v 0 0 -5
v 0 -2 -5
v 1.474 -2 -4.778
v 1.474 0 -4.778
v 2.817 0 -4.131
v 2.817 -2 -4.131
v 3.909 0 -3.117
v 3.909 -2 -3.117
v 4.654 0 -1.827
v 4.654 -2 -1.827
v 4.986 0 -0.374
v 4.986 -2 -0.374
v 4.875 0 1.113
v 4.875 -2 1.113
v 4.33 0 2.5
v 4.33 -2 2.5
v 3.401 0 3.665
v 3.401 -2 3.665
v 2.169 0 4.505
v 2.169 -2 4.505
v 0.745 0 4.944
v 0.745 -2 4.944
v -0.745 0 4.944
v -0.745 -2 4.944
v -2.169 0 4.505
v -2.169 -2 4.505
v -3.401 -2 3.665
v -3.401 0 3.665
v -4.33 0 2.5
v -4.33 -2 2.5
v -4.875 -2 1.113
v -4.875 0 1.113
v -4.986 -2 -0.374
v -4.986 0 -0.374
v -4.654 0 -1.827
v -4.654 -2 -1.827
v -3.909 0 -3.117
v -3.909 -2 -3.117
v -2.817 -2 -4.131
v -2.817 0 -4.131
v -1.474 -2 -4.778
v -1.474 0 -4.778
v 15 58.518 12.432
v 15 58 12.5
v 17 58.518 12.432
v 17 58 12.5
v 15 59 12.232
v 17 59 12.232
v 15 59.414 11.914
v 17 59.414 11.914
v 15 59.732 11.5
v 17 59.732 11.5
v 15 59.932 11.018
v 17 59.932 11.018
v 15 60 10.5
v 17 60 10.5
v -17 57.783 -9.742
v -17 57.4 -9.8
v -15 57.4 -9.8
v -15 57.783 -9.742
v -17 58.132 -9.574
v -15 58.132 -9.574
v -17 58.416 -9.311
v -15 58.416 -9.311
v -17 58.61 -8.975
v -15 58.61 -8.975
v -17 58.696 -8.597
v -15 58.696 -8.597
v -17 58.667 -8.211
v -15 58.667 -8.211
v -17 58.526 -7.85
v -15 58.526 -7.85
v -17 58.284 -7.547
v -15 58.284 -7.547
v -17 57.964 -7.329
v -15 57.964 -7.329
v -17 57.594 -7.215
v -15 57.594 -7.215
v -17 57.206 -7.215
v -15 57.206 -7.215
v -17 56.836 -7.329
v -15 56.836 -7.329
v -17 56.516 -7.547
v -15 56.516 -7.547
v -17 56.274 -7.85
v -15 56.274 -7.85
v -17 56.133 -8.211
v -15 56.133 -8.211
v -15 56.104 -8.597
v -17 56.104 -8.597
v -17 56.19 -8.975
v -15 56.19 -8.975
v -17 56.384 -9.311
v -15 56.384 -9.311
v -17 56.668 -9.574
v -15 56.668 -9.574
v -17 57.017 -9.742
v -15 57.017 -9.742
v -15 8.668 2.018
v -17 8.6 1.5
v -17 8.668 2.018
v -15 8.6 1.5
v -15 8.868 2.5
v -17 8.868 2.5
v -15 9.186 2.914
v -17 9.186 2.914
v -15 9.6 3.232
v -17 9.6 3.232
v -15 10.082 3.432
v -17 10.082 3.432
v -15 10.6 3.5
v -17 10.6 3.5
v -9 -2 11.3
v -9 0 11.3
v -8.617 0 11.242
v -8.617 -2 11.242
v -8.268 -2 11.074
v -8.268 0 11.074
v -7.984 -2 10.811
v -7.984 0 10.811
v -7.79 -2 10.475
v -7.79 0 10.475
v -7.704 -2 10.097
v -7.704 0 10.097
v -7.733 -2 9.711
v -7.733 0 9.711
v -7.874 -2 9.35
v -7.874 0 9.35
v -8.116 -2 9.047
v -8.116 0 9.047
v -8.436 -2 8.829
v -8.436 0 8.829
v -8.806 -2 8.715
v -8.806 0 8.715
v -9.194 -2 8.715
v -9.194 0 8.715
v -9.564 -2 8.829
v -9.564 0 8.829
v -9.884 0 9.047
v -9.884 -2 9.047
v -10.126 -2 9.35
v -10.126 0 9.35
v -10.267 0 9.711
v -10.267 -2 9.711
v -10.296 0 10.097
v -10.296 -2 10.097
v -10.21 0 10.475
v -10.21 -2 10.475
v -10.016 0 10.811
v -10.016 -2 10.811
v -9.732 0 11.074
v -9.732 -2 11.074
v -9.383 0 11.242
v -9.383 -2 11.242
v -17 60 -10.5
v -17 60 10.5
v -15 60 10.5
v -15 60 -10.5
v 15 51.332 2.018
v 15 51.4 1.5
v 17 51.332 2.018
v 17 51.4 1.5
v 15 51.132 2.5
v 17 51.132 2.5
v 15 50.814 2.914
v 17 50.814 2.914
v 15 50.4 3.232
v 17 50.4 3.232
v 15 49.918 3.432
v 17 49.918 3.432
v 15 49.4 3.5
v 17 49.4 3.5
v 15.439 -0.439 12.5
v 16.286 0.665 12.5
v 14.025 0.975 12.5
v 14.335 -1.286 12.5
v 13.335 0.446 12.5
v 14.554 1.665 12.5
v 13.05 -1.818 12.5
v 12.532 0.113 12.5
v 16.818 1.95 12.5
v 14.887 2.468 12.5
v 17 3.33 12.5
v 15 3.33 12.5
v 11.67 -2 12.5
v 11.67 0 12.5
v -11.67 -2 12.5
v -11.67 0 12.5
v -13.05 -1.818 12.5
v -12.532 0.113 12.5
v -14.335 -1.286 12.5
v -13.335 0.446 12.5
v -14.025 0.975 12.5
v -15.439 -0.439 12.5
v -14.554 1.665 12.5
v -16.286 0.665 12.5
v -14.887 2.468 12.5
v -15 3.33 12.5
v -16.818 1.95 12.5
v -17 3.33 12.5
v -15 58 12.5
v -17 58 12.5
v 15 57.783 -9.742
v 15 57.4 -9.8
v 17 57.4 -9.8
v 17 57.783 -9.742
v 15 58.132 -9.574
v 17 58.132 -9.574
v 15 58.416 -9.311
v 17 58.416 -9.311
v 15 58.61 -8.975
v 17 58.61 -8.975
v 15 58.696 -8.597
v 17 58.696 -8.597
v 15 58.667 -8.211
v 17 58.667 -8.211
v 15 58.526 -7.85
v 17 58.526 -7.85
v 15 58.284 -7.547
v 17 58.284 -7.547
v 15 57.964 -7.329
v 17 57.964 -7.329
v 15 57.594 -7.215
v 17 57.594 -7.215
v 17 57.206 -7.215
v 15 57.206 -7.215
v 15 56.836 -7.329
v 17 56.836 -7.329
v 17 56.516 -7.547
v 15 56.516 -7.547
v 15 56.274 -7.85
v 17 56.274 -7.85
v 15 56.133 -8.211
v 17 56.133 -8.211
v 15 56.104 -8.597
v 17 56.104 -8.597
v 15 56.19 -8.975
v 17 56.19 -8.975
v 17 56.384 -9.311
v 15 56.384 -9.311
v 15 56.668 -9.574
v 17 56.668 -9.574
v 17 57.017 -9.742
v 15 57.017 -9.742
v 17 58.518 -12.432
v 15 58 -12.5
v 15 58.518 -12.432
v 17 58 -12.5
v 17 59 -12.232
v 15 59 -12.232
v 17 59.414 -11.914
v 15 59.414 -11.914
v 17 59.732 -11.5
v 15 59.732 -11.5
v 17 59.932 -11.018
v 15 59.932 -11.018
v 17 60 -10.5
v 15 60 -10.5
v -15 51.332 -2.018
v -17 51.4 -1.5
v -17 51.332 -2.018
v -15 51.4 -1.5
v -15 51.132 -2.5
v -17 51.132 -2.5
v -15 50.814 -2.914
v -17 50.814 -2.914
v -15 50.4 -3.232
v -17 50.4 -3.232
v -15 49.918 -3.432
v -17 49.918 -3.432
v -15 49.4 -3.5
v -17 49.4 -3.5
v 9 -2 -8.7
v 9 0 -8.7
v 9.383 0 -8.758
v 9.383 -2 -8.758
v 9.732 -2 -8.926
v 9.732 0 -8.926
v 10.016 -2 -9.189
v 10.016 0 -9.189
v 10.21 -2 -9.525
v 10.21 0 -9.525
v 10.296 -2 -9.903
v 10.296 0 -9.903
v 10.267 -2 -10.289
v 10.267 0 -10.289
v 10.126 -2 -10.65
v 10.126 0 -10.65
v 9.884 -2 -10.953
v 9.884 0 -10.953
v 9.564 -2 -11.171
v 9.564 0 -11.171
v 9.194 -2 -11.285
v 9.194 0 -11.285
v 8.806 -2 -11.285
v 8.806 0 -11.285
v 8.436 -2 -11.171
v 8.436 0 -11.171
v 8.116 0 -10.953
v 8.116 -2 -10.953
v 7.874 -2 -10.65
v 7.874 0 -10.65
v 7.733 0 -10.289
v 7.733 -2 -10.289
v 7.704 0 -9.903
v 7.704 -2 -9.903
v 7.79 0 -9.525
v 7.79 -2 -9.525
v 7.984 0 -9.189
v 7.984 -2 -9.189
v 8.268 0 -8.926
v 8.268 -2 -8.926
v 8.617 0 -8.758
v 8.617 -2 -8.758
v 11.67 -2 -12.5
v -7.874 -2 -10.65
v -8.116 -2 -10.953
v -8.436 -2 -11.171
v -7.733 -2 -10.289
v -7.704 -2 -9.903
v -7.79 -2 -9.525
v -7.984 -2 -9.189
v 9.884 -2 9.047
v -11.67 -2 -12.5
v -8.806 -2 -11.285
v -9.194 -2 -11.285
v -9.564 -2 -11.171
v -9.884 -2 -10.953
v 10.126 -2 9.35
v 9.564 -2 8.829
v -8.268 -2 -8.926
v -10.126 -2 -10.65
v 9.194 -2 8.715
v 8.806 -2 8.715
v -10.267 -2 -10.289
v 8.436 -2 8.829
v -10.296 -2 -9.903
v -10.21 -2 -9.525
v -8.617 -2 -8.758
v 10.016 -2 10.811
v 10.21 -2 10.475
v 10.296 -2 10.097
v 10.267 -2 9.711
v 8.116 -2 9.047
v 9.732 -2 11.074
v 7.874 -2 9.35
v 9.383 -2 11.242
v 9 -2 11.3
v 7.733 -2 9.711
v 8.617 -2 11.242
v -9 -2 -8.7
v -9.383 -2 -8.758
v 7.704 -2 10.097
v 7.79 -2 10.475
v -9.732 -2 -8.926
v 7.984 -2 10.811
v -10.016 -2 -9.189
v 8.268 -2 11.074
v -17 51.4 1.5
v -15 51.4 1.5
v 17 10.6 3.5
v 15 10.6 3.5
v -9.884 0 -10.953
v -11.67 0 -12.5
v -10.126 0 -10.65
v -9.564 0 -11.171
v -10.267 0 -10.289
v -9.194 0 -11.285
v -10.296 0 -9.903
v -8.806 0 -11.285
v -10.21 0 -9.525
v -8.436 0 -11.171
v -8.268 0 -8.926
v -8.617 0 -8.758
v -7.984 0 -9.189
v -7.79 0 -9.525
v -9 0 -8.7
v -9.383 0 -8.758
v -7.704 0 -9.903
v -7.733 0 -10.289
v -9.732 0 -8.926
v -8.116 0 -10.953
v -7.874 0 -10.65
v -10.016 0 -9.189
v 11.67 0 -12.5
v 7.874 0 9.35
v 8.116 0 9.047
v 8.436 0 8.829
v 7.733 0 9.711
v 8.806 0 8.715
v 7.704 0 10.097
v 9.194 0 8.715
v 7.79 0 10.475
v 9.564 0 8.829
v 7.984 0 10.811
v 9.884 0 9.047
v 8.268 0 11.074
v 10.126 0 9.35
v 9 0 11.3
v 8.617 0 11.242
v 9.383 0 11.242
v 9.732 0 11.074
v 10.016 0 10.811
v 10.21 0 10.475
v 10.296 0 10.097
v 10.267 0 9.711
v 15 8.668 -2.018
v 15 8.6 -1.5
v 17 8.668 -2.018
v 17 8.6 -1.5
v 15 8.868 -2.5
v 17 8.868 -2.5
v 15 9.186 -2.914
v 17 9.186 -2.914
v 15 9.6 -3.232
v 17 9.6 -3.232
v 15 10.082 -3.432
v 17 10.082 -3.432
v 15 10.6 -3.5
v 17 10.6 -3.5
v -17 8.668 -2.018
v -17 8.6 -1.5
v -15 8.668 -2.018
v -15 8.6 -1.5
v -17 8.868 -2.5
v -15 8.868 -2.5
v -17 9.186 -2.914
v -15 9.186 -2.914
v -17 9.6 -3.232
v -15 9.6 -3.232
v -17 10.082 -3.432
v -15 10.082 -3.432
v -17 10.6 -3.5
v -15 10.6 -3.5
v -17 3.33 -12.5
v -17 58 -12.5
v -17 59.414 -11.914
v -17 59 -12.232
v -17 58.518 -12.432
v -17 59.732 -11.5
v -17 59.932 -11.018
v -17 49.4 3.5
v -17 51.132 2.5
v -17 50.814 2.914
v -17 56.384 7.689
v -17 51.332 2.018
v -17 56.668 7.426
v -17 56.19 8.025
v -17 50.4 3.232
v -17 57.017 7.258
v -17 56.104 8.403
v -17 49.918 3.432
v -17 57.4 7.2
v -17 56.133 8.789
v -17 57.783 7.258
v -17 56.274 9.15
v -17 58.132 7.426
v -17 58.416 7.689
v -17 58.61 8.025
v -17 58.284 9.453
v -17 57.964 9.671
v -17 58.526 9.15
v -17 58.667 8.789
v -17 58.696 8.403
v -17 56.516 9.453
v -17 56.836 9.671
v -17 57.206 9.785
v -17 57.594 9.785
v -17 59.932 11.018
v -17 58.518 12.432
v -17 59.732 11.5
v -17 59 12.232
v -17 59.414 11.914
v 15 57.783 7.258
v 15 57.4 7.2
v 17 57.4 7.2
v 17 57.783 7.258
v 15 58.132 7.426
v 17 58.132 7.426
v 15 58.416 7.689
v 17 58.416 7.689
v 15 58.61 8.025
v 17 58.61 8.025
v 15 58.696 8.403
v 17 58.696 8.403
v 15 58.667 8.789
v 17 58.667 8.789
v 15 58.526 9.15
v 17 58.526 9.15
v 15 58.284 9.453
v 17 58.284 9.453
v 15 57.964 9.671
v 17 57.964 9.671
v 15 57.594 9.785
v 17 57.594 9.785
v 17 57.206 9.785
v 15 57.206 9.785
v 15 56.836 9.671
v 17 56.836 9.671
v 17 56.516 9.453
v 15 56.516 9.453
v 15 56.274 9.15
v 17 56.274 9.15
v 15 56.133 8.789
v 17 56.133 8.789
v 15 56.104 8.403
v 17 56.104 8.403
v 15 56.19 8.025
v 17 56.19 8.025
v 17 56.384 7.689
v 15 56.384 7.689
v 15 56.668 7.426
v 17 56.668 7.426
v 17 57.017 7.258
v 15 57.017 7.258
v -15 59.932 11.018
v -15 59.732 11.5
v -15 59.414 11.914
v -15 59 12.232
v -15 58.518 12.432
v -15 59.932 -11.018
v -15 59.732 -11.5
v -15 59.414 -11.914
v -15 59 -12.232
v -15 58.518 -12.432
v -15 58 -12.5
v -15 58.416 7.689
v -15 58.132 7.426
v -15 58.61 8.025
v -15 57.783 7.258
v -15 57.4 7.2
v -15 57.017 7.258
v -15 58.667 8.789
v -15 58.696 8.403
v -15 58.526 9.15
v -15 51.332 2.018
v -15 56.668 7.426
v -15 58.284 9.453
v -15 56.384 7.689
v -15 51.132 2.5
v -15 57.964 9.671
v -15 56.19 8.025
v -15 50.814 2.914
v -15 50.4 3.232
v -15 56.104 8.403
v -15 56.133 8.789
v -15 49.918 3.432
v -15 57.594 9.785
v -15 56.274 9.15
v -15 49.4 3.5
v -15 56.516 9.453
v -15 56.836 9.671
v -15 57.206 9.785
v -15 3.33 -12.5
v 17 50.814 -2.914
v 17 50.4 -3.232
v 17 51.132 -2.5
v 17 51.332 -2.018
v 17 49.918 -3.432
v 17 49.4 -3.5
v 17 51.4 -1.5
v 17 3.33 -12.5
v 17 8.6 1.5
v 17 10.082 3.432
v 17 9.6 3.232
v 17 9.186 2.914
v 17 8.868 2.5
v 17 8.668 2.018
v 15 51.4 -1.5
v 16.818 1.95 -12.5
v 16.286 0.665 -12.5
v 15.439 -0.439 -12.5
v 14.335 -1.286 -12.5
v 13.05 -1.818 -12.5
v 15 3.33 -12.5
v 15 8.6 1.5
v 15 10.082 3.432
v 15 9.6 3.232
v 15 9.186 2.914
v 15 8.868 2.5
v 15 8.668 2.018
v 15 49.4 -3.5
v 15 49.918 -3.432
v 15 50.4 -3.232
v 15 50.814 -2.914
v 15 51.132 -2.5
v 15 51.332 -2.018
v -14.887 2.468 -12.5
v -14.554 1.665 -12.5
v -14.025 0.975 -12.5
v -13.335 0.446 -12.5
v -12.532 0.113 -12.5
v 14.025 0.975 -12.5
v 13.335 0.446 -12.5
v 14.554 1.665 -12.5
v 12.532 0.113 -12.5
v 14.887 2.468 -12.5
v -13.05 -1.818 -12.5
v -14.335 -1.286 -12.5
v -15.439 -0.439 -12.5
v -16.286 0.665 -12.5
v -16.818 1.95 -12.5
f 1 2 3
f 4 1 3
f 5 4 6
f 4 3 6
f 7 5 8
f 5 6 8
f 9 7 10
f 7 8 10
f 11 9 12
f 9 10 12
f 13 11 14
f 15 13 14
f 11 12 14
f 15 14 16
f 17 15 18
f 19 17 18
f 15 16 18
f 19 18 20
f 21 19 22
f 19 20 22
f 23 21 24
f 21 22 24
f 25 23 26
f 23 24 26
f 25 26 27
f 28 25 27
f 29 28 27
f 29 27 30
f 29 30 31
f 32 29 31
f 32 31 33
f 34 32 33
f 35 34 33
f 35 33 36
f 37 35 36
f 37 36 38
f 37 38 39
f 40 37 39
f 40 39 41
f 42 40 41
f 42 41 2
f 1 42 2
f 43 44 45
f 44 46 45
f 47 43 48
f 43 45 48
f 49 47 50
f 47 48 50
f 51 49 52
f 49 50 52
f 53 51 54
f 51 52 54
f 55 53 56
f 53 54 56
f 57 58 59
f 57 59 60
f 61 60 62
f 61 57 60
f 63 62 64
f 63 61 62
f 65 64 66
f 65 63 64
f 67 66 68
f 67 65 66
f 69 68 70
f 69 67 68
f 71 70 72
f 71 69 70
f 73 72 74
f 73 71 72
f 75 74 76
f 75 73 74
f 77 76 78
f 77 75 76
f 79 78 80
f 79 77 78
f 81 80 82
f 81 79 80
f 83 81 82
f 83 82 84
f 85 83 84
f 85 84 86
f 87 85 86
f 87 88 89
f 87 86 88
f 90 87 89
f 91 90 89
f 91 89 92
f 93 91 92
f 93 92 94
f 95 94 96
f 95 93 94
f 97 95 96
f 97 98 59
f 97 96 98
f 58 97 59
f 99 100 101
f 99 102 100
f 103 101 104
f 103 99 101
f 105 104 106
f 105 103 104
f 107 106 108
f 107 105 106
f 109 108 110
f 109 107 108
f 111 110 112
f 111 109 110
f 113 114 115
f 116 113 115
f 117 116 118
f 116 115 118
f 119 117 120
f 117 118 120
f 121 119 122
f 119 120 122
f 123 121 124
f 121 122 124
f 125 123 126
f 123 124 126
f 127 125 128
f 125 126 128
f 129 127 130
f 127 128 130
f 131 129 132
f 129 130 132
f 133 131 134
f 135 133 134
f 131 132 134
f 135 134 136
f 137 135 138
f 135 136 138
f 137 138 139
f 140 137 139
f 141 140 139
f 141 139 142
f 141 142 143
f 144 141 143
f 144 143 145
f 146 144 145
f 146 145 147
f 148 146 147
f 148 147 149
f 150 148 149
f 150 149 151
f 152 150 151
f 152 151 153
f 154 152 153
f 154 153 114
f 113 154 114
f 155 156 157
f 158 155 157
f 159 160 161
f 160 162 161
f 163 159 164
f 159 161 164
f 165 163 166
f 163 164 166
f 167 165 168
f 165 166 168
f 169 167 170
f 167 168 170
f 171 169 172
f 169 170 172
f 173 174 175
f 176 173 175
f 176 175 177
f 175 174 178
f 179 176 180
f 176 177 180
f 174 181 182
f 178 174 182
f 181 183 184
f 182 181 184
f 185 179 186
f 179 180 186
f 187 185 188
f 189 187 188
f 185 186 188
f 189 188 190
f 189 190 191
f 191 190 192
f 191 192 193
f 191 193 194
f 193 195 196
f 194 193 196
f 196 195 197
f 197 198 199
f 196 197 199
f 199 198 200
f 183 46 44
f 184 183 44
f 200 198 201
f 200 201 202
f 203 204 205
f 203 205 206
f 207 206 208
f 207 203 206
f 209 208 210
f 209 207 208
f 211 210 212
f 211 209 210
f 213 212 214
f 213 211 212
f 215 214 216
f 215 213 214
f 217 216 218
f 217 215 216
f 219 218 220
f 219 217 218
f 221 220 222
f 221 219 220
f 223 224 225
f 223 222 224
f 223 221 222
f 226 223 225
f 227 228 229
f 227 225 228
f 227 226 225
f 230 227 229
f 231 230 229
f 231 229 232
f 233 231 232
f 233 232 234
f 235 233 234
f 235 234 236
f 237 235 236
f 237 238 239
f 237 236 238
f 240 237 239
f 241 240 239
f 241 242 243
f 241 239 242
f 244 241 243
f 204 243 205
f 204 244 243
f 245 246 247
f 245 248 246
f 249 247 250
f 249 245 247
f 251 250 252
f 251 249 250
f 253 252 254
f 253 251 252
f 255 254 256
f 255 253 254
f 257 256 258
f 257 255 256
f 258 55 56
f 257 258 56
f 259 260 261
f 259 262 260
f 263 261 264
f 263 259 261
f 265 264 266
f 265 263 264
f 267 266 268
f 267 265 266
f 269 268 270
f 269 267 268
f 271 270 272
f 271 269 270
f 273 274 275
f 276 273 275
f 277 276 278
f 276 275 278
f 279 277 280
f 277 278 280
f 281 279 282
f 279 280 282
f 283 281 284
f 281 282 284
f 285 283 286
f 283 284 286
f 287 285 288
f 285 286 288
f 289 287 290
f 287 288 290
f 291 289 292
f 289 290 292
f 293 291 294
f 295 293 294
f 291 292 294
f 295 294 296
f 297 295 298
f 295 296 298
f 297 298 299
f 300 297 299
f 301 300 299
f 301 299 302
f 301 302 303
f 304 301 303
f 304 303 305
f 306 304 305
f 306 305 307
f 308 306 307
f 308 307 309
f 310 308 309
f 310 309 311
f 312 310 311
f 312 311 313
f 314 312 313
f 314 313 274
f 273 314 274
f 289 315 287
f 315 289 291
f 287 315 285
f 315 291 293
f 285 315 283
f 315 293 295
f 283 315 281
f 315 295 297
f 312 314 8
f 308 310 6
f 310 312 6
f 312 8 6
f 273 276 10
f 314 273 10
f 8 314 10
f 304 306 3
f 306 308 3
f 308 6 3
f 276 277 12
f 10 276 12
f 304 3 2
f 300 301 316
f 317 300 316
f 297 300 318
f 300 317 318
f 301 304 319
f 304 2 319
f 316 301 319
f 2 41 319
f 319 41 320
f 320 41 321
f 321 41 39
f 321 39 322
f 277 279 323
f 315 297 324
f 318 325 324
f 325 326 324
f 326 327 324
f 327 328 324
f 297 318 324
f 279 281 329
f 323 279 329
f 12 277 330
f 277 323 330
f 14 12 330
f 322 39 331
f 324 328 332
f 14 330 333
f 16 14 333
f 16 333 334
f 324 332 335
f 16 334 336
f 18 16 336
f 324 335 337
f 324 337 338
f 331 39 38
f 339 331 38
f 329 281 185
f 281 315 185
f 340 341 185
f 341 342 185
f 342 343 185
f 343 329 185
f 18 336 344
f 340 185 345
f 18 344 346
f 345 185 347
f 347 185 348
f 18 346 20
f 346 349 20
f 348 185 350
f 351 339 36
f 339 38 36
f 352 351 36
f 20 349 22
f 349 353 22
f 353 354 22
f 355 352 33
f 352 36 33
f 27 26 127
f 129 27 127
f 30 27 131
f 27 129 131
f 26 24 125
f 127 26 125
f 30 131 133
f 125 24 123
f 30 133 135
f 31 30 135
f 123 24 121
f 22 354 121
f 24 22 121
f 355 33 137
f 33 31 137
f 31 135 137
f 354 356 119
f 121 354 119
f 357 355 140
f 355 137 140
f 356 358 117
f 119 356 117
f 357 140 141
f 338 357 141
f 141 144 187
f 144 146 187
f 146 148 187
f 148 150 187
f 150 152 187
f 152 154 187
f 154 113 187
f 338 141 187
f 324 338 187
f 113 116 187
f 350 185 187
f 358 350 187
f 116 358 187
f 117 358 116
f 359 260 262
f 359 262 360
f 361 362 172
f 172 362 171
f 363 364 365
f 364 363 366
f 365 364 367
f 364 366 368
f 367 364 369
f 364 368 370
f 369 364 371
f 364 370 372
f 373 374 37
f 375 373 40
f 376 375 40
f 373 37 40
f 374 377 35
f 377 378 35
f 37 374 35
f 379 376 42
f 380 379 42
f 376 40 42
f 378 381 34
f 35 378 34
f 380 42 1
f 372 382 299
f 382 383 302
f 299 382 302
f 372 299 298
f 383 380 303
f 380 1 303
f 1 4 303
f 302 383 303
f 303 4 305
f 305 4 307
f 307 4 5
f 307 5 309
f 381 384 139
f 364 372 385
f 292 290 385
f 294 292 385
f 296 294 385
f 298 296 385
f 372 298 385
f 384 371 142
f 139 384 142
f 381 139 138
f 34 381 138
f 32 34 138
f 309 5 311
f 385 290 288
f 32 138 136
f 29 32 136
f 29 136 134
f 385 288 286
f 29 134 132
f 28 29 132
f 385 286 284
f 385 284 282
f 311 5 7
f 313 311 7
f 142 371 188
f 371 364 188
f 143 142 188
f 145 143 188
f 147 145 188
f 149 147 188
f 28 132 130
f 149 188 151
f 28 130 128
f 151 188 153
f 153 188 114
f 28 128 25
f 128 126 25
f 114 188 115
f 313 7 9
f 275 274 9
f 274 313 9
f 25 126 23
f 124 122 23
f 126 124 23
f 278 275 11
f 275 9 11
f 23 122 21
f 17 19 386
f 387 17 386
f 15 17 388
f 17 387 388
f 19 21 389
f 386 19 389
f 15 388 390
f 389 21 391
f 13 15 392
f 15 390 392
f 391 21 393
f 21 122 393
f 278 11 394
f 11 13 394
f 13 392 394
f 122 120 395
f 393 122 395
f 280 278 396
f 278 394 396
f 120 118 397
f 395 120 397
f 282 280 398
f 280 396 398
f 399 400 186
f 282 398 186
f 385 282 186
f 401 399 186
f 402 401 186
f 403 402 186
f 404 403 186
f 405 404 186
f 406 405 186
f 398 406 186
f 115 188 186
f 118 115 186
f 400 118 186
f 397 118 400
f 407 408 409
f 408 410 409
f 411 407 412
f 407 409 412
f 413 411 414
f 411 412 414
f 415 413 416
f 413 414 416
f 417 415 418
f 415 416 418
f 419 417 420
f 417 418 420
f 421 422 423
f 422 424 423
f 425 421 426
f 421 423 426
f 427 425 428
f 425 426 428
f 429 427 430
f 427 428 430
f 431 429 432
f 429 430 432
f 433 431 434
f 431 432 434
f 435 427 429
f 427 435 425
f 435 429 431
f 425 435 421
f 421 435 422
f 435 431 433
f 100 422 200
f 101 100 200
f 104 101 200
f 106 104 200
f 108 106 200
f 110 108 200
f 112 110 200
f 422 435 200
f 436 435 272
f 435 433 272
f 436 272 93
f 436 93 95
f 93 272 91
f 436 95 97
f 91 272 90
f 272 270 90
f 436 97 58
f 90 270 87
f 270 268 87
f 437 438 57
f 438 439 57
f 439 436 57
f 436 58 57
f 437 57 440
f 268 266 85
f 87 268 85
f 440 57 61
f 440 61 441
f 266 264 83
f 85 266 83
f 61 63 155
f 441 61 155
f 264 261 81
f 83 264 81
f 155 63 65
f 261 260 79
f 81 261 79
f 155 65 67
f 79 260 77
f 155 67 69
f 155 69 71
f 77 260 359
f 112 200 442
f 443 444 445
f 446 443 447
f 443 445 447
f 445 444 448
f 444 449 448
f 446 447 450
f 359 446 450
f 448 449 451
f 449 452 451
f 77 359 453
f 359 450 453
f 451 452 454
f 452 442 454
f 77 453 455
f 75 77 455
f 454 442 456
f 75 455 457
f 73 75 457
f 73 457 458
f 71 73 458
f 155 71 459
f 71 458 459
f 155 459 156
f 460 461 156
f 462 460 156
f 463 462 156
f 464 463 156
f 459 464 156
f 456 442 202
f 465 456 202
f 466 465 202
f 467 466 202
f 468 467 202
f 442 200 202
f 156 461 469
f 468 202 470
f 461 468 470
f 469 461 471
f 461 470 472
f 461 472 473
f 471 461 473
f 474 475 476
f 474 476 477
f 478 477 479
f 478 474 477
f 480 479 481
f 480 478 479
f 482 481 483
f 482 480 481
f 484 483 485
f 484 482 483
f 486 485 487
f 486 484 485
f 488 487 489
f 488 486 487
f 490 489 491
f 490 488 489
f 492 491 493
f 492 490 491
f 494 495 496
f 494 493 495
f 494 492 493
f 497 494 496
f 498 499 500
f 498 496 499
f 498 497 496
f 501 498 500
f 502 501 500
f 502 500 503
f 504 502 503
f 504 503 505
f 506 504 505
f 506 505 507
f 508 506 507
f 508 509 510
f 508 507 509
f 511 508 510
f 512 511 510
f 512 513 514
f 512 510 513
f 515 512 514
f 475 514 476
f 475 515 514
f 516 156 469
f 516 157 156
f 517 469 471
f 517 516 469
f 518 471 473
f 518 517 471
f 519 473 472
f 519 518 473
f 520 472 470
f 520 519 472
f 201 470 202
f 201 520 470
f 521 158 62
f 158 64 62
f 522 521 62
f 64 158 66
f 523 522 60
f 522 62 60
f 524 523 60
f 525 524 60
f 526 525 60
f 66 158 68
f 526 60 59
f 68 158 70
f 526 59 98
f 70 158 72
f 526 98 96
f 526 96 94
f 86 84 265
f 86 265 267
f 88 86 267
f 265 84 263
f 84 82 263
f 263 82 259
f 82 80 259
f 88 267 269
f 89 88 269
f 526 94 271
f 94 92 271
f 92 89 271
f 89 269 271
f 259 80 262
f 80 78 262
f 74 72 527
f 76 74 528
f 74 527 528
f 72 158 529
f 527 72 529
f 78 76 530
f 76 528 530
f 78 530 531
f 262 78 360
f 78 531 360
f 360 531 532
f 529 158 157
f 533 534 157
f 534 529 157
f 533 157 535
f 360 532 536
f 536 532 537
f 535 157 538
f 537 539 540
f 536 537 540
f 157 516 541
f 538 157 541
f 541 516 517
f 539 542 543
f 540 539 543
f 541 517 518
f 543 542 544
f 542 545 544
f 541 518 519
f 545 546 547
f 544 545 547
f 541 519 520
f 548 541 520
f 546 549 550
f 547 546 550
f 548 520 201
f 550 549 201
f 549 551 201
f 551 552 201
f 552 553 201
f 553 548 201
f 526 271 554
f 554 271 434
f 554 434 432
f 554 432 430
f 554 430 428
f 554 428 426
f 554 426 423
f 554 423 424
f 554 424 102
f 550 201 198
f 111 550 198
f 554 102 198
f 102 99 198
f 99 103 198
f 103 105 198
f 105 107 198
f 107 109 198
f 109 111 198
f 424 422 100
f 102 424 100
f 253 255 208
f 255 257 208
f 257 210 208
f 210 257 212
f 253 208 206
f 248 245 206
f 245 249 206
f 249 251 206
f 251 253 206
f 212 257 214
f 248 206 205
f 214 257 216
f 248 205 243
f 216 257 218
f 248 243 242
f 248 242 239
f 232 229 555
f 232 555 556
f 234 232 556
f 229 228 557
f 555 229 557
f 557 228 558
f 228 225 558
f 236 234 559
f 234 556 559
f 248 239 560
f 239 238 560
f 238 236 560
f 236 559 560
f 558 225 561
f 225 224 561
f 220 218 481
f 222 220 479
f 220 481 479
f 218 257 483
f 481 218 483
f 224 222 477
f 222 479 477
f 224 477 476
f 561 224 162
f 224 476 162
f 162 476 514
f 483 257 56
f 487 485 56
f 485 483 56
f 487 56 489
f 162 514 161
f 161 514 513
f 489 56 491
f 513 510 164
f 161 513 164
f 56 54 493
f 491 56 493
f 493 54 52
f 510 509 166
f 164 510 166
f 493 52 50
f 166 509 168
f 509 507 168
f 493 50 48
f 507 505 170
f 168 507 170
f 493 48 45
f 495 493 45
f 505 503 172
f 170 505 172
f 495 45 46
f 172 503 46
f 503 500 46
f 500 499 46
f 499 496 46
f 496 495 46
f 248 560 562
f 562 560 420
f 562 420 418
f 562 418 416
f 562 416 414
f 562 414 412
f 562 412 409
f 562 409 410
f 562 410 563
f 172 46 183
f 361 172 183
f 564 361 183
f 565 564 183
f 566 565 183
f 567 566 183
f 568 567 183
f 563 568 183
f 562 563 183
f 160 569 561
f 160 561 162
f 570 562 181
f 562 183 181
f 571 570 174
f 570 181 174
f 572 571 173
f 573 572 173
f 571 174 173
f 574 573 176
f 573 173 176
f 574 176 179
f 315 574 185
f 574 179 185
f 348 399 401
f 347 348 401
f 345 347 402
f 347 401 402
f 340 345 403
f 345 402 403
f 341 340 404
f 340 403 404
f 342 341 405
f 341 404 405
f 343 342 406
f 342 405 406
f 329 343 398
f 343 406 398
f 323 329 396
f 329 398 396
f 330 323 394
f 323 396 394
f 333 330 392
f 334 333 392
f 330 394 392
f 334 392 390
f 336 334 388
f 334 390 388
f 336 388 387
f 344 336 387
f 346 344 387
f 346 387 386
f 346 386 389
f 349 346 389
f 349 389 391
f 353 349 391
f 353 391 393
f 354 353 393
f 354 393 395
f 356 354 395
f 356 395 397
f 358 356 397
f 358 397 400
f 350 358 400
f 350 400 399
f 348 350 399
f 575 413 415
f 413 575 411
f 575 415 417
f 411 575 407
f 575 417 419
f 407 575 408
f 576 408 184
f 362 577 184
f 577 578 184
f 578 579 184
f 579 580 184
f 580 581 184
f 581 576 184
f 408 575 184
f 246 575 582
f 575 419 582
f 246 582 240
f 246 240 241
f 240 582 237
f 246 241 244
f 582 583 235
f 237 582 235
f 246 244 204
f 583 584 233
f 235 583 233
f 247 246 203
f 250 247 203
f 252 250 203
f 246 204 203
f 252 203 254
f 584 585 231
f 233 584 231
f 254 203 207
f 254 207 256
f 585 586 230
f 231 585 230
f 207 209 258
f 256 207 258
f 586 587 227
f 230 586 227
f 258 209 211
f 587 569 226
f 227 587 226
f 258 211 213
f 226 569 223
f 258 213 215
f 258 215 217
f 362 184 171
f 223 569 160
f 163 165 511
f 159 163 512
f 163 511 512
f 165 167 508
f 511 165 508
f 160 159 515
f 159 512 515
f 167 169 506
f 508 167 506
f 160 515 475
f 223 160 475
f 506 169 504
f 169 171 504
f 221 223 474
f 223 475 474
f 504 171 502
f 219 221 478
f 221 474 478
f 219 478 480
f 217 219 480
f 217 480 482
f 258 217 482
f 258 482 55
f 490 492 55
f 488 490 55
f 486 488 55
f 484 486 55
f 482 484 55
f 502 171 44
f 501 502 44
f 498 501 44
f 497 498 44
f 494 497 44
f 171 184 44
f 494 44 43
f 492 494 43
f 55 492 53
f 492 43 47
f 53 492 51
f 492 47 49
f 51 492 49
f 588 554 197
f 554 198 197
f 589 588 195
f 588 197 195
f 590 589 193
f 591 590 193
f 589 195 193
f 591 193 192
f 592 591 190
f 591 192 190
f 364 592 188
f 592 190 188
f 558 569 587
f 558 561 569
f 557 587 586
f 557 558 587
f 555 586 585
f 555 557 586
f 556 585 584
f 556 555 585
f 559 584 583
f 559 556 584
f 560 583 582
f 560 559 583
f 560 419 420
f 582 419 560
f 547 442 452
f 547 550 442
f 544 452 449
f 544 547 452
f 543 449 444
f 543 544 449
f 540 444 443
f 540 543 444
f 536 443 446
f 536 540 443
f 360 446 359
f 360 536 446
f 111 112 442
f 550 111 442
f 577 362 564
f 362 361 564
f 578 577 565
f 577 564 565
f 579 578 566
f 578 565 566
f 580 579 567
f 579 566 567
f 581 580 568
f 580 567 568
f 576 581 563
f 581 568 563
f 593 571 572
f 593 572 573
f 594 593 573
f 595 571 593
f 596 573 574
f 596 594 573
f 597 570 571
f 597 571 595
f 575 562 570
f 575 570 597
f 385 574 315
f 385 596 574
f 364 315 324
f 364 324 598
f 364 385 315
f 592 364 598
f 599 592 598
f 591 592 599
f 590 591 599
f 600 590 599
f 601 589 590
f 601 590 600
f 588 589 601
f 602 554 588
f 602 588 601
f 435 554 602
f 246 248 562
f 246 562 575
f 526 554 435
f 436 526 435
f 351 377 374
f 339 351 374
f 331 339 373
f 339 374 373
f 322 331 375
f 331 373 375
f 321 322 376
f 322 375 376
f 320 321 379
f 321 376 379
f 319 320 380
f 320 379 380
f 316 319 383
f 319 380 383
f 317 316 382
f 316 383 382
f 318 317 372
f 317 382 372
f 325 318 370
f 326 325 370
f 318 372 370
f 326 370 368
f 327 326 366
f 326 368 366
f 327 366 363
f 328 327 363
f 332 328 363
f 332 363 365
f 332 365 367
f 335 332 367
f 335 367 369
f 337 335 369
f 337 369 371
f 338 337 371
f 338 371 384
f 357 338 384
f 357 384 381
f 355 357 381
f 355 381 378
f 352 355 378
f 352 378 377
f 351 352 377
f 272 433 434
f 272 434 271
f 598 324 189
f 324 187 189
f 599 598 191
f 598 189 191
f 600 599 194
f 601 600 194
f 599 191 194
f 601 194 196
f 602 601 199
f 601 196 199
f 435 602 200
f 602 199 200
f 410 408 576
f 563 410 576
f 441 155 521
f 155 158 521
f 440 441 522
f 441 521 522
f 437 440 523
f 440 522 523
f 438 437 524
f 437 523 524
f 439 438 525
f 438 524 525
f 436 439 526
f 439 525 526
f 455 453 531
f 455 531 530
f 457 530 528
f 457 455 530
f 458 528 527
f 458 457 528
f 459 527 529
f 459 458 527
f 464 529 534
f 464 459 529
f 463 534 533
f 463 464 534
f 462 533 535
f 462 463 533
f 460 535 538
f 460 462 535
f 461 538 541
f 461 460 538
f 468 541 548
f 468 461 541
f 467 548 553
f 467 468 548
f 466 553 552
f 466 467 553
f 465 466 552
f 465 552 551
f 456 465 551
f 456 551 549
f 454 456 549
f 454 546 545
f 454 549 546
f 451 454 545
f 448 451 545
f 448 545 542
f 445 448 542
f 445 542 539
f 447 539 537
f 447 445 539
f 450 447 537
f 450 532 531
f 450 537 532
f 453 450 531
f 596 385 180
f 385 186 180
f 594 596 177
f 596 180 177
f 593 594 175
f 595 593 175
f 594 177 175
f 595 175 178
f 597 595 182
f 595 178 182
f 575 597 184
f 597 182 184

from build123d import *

# Parameters (mm, degrees)
BASE_FLANGE1_DEPTH      = 12.5
CUT_EXTRUDE2_DEPTH      = 64.602279833
CUT_EXTRUDE2_DEPTH_BACK = 64.602279833
SKETCH7_R               = 1.3
SKETCH16_R              = 5
CUT_EXTRUDE5_DEPTH      = 10
SKETCH17_R              = 1.3
CUT_EXTRUDE6_DEPTH      = 10
FILLET3_R               = 2
SKETCH18_W              = 7
SKETCH18_H              = 42.8
CUT_EXTRUDE7_DEPTH      = 71.087445381
FILLET4_R               = 2


# Sheet-metal steps are written as plain solids
with BuildPart() as part:
    # Sketch1 → Base-Flange1 (new, symmetric)
    with BuildSketch(Plane.XY):
        with BuildLine():
            Line((-15, 60), (-15, 3.33))
            ThreePointArc((-15, 3.33), (-14.024665581, 0.975334419), (-11.67, 0))
            Line((-11.67, 0), (11.67, 0))
            ThreePointArc((11.67, 0), (14.024665581, 0.975334419), (15, 3.33))
            Line((15, 3.33), (15, 60))
            Line((15, 60), (17, 60))
            Line((17, 60), (17, 3.33))
            ThreePointArc((17, 3.33), (15.438879144, -0.438879144), (11.67, -2))
            Line((11.67, -2), (-11.67, -2))
            ThreePointArc((-11.67, -2), (-15.438879144, -0.438879144), (-17, 3.33))
            Line((-17, 3.33), (-17, 60))
            Line((-17, 60), (-15, 60))
        make_face()
    extrude(amount=BASE_FLANGE1_DEPTH, both=True)

    # Sketch7 → Cut-Extrude2 (cut, two sides: drawn at the far end of the back side and taken through both)
    with BuildSketch(Plane(origin=(0, 0, 0), x_dir=(0, 0, -1), z_dir=(1, 0, 0)).offset(-CUT_EXTRUDE2_DEPTH_BACK)):
        with Locations((-8.5, 57.4)):
            Circle(SKETCH7_R)
        with Locations((8.5, 57.4)):
            Circle(SKETCH7_R)
    extrude(amount=CUT_EXTRUDE2_DEPTH + CUT_EXTRUDE2_DEPTH_BACK, mode=Mode.SUBTRACT)

    # Sketch16 → Cut-Extrude5 (cut)
    with BuildSketch(Plane.XZ.offset(2)):
        with Locations(Location((0, 0, 0), (0, 0, 270))):
            Circle(SKETCH16_R)
    extrude(amount=-CUT_EXTRUDE5_DEPTH, mode=Mode.SUBTRACT)

    # Sketch17 → Cut-Extrude6 (cut)
    with BuildSketch(Plane(origin=(0, 0, 0), x_dir=(1, 0, 0), z_dir=(0, 1, 0))):
        with Locations(Location((-9, 10, 0), (0, 0, 270))):
            Circle(SKETCH17_R)
        with Locations(Location((9, 10, 0), (0, 0, 270))):
            Circle(SKETCH17_R)
        with Locations(Location((9, -10, 0), (0, 0, 270))):
            Circle(SKETCH17_R)
        with Locations(Location((-9, -10, 0), (0, 0, 270))):
            Circle(SKETCH17_R)
    extrude(amount=-CUT_EXTRUDE6_DEPTH, mode=Mode.SUBTRACT)

    # Fillet3
    fillet3_edges = [part.edges().sort_by_distance(p)[0] for p in [
        (-16, 60, -12.5),
        (16, 60, -12.5),
        (-16, 60, 12.5),
        (16, 60, 12.5),
    ]]
    fillet(fillet3_edges, radius=FILLET3_R)

    # Sketch18 → Cut-Extrude7 (cut, through all)
    with BuildSketch(Plane.ZY.offset(17)):
        with Locations((0, 30)):
            Rectangle(SKETCH18_W, SKETCH18_H)
    extrude(amount=-CUT_EXTRUDE7_DEPTH, mode=Mode.SUBTRACT)

    # Fillet4
    fillet4_edges = [part.edges().sort_by_distance(p)[0] for p in [
        (16, 51.4, 3.5),
        (16, 8.6, 3.5),
        (16, 8.6, -3.5),
        (16, 51.4, -3.5),
        (-16, 51.4, 3.5),
        (-16, 8.6, 3.5),
        (-16, 8.6, -3.5),
        (-16, 51.4, -3.5),
    ]]
    fillet(fillet4_edges, radius=FILLET4_R)


solid = part.part
